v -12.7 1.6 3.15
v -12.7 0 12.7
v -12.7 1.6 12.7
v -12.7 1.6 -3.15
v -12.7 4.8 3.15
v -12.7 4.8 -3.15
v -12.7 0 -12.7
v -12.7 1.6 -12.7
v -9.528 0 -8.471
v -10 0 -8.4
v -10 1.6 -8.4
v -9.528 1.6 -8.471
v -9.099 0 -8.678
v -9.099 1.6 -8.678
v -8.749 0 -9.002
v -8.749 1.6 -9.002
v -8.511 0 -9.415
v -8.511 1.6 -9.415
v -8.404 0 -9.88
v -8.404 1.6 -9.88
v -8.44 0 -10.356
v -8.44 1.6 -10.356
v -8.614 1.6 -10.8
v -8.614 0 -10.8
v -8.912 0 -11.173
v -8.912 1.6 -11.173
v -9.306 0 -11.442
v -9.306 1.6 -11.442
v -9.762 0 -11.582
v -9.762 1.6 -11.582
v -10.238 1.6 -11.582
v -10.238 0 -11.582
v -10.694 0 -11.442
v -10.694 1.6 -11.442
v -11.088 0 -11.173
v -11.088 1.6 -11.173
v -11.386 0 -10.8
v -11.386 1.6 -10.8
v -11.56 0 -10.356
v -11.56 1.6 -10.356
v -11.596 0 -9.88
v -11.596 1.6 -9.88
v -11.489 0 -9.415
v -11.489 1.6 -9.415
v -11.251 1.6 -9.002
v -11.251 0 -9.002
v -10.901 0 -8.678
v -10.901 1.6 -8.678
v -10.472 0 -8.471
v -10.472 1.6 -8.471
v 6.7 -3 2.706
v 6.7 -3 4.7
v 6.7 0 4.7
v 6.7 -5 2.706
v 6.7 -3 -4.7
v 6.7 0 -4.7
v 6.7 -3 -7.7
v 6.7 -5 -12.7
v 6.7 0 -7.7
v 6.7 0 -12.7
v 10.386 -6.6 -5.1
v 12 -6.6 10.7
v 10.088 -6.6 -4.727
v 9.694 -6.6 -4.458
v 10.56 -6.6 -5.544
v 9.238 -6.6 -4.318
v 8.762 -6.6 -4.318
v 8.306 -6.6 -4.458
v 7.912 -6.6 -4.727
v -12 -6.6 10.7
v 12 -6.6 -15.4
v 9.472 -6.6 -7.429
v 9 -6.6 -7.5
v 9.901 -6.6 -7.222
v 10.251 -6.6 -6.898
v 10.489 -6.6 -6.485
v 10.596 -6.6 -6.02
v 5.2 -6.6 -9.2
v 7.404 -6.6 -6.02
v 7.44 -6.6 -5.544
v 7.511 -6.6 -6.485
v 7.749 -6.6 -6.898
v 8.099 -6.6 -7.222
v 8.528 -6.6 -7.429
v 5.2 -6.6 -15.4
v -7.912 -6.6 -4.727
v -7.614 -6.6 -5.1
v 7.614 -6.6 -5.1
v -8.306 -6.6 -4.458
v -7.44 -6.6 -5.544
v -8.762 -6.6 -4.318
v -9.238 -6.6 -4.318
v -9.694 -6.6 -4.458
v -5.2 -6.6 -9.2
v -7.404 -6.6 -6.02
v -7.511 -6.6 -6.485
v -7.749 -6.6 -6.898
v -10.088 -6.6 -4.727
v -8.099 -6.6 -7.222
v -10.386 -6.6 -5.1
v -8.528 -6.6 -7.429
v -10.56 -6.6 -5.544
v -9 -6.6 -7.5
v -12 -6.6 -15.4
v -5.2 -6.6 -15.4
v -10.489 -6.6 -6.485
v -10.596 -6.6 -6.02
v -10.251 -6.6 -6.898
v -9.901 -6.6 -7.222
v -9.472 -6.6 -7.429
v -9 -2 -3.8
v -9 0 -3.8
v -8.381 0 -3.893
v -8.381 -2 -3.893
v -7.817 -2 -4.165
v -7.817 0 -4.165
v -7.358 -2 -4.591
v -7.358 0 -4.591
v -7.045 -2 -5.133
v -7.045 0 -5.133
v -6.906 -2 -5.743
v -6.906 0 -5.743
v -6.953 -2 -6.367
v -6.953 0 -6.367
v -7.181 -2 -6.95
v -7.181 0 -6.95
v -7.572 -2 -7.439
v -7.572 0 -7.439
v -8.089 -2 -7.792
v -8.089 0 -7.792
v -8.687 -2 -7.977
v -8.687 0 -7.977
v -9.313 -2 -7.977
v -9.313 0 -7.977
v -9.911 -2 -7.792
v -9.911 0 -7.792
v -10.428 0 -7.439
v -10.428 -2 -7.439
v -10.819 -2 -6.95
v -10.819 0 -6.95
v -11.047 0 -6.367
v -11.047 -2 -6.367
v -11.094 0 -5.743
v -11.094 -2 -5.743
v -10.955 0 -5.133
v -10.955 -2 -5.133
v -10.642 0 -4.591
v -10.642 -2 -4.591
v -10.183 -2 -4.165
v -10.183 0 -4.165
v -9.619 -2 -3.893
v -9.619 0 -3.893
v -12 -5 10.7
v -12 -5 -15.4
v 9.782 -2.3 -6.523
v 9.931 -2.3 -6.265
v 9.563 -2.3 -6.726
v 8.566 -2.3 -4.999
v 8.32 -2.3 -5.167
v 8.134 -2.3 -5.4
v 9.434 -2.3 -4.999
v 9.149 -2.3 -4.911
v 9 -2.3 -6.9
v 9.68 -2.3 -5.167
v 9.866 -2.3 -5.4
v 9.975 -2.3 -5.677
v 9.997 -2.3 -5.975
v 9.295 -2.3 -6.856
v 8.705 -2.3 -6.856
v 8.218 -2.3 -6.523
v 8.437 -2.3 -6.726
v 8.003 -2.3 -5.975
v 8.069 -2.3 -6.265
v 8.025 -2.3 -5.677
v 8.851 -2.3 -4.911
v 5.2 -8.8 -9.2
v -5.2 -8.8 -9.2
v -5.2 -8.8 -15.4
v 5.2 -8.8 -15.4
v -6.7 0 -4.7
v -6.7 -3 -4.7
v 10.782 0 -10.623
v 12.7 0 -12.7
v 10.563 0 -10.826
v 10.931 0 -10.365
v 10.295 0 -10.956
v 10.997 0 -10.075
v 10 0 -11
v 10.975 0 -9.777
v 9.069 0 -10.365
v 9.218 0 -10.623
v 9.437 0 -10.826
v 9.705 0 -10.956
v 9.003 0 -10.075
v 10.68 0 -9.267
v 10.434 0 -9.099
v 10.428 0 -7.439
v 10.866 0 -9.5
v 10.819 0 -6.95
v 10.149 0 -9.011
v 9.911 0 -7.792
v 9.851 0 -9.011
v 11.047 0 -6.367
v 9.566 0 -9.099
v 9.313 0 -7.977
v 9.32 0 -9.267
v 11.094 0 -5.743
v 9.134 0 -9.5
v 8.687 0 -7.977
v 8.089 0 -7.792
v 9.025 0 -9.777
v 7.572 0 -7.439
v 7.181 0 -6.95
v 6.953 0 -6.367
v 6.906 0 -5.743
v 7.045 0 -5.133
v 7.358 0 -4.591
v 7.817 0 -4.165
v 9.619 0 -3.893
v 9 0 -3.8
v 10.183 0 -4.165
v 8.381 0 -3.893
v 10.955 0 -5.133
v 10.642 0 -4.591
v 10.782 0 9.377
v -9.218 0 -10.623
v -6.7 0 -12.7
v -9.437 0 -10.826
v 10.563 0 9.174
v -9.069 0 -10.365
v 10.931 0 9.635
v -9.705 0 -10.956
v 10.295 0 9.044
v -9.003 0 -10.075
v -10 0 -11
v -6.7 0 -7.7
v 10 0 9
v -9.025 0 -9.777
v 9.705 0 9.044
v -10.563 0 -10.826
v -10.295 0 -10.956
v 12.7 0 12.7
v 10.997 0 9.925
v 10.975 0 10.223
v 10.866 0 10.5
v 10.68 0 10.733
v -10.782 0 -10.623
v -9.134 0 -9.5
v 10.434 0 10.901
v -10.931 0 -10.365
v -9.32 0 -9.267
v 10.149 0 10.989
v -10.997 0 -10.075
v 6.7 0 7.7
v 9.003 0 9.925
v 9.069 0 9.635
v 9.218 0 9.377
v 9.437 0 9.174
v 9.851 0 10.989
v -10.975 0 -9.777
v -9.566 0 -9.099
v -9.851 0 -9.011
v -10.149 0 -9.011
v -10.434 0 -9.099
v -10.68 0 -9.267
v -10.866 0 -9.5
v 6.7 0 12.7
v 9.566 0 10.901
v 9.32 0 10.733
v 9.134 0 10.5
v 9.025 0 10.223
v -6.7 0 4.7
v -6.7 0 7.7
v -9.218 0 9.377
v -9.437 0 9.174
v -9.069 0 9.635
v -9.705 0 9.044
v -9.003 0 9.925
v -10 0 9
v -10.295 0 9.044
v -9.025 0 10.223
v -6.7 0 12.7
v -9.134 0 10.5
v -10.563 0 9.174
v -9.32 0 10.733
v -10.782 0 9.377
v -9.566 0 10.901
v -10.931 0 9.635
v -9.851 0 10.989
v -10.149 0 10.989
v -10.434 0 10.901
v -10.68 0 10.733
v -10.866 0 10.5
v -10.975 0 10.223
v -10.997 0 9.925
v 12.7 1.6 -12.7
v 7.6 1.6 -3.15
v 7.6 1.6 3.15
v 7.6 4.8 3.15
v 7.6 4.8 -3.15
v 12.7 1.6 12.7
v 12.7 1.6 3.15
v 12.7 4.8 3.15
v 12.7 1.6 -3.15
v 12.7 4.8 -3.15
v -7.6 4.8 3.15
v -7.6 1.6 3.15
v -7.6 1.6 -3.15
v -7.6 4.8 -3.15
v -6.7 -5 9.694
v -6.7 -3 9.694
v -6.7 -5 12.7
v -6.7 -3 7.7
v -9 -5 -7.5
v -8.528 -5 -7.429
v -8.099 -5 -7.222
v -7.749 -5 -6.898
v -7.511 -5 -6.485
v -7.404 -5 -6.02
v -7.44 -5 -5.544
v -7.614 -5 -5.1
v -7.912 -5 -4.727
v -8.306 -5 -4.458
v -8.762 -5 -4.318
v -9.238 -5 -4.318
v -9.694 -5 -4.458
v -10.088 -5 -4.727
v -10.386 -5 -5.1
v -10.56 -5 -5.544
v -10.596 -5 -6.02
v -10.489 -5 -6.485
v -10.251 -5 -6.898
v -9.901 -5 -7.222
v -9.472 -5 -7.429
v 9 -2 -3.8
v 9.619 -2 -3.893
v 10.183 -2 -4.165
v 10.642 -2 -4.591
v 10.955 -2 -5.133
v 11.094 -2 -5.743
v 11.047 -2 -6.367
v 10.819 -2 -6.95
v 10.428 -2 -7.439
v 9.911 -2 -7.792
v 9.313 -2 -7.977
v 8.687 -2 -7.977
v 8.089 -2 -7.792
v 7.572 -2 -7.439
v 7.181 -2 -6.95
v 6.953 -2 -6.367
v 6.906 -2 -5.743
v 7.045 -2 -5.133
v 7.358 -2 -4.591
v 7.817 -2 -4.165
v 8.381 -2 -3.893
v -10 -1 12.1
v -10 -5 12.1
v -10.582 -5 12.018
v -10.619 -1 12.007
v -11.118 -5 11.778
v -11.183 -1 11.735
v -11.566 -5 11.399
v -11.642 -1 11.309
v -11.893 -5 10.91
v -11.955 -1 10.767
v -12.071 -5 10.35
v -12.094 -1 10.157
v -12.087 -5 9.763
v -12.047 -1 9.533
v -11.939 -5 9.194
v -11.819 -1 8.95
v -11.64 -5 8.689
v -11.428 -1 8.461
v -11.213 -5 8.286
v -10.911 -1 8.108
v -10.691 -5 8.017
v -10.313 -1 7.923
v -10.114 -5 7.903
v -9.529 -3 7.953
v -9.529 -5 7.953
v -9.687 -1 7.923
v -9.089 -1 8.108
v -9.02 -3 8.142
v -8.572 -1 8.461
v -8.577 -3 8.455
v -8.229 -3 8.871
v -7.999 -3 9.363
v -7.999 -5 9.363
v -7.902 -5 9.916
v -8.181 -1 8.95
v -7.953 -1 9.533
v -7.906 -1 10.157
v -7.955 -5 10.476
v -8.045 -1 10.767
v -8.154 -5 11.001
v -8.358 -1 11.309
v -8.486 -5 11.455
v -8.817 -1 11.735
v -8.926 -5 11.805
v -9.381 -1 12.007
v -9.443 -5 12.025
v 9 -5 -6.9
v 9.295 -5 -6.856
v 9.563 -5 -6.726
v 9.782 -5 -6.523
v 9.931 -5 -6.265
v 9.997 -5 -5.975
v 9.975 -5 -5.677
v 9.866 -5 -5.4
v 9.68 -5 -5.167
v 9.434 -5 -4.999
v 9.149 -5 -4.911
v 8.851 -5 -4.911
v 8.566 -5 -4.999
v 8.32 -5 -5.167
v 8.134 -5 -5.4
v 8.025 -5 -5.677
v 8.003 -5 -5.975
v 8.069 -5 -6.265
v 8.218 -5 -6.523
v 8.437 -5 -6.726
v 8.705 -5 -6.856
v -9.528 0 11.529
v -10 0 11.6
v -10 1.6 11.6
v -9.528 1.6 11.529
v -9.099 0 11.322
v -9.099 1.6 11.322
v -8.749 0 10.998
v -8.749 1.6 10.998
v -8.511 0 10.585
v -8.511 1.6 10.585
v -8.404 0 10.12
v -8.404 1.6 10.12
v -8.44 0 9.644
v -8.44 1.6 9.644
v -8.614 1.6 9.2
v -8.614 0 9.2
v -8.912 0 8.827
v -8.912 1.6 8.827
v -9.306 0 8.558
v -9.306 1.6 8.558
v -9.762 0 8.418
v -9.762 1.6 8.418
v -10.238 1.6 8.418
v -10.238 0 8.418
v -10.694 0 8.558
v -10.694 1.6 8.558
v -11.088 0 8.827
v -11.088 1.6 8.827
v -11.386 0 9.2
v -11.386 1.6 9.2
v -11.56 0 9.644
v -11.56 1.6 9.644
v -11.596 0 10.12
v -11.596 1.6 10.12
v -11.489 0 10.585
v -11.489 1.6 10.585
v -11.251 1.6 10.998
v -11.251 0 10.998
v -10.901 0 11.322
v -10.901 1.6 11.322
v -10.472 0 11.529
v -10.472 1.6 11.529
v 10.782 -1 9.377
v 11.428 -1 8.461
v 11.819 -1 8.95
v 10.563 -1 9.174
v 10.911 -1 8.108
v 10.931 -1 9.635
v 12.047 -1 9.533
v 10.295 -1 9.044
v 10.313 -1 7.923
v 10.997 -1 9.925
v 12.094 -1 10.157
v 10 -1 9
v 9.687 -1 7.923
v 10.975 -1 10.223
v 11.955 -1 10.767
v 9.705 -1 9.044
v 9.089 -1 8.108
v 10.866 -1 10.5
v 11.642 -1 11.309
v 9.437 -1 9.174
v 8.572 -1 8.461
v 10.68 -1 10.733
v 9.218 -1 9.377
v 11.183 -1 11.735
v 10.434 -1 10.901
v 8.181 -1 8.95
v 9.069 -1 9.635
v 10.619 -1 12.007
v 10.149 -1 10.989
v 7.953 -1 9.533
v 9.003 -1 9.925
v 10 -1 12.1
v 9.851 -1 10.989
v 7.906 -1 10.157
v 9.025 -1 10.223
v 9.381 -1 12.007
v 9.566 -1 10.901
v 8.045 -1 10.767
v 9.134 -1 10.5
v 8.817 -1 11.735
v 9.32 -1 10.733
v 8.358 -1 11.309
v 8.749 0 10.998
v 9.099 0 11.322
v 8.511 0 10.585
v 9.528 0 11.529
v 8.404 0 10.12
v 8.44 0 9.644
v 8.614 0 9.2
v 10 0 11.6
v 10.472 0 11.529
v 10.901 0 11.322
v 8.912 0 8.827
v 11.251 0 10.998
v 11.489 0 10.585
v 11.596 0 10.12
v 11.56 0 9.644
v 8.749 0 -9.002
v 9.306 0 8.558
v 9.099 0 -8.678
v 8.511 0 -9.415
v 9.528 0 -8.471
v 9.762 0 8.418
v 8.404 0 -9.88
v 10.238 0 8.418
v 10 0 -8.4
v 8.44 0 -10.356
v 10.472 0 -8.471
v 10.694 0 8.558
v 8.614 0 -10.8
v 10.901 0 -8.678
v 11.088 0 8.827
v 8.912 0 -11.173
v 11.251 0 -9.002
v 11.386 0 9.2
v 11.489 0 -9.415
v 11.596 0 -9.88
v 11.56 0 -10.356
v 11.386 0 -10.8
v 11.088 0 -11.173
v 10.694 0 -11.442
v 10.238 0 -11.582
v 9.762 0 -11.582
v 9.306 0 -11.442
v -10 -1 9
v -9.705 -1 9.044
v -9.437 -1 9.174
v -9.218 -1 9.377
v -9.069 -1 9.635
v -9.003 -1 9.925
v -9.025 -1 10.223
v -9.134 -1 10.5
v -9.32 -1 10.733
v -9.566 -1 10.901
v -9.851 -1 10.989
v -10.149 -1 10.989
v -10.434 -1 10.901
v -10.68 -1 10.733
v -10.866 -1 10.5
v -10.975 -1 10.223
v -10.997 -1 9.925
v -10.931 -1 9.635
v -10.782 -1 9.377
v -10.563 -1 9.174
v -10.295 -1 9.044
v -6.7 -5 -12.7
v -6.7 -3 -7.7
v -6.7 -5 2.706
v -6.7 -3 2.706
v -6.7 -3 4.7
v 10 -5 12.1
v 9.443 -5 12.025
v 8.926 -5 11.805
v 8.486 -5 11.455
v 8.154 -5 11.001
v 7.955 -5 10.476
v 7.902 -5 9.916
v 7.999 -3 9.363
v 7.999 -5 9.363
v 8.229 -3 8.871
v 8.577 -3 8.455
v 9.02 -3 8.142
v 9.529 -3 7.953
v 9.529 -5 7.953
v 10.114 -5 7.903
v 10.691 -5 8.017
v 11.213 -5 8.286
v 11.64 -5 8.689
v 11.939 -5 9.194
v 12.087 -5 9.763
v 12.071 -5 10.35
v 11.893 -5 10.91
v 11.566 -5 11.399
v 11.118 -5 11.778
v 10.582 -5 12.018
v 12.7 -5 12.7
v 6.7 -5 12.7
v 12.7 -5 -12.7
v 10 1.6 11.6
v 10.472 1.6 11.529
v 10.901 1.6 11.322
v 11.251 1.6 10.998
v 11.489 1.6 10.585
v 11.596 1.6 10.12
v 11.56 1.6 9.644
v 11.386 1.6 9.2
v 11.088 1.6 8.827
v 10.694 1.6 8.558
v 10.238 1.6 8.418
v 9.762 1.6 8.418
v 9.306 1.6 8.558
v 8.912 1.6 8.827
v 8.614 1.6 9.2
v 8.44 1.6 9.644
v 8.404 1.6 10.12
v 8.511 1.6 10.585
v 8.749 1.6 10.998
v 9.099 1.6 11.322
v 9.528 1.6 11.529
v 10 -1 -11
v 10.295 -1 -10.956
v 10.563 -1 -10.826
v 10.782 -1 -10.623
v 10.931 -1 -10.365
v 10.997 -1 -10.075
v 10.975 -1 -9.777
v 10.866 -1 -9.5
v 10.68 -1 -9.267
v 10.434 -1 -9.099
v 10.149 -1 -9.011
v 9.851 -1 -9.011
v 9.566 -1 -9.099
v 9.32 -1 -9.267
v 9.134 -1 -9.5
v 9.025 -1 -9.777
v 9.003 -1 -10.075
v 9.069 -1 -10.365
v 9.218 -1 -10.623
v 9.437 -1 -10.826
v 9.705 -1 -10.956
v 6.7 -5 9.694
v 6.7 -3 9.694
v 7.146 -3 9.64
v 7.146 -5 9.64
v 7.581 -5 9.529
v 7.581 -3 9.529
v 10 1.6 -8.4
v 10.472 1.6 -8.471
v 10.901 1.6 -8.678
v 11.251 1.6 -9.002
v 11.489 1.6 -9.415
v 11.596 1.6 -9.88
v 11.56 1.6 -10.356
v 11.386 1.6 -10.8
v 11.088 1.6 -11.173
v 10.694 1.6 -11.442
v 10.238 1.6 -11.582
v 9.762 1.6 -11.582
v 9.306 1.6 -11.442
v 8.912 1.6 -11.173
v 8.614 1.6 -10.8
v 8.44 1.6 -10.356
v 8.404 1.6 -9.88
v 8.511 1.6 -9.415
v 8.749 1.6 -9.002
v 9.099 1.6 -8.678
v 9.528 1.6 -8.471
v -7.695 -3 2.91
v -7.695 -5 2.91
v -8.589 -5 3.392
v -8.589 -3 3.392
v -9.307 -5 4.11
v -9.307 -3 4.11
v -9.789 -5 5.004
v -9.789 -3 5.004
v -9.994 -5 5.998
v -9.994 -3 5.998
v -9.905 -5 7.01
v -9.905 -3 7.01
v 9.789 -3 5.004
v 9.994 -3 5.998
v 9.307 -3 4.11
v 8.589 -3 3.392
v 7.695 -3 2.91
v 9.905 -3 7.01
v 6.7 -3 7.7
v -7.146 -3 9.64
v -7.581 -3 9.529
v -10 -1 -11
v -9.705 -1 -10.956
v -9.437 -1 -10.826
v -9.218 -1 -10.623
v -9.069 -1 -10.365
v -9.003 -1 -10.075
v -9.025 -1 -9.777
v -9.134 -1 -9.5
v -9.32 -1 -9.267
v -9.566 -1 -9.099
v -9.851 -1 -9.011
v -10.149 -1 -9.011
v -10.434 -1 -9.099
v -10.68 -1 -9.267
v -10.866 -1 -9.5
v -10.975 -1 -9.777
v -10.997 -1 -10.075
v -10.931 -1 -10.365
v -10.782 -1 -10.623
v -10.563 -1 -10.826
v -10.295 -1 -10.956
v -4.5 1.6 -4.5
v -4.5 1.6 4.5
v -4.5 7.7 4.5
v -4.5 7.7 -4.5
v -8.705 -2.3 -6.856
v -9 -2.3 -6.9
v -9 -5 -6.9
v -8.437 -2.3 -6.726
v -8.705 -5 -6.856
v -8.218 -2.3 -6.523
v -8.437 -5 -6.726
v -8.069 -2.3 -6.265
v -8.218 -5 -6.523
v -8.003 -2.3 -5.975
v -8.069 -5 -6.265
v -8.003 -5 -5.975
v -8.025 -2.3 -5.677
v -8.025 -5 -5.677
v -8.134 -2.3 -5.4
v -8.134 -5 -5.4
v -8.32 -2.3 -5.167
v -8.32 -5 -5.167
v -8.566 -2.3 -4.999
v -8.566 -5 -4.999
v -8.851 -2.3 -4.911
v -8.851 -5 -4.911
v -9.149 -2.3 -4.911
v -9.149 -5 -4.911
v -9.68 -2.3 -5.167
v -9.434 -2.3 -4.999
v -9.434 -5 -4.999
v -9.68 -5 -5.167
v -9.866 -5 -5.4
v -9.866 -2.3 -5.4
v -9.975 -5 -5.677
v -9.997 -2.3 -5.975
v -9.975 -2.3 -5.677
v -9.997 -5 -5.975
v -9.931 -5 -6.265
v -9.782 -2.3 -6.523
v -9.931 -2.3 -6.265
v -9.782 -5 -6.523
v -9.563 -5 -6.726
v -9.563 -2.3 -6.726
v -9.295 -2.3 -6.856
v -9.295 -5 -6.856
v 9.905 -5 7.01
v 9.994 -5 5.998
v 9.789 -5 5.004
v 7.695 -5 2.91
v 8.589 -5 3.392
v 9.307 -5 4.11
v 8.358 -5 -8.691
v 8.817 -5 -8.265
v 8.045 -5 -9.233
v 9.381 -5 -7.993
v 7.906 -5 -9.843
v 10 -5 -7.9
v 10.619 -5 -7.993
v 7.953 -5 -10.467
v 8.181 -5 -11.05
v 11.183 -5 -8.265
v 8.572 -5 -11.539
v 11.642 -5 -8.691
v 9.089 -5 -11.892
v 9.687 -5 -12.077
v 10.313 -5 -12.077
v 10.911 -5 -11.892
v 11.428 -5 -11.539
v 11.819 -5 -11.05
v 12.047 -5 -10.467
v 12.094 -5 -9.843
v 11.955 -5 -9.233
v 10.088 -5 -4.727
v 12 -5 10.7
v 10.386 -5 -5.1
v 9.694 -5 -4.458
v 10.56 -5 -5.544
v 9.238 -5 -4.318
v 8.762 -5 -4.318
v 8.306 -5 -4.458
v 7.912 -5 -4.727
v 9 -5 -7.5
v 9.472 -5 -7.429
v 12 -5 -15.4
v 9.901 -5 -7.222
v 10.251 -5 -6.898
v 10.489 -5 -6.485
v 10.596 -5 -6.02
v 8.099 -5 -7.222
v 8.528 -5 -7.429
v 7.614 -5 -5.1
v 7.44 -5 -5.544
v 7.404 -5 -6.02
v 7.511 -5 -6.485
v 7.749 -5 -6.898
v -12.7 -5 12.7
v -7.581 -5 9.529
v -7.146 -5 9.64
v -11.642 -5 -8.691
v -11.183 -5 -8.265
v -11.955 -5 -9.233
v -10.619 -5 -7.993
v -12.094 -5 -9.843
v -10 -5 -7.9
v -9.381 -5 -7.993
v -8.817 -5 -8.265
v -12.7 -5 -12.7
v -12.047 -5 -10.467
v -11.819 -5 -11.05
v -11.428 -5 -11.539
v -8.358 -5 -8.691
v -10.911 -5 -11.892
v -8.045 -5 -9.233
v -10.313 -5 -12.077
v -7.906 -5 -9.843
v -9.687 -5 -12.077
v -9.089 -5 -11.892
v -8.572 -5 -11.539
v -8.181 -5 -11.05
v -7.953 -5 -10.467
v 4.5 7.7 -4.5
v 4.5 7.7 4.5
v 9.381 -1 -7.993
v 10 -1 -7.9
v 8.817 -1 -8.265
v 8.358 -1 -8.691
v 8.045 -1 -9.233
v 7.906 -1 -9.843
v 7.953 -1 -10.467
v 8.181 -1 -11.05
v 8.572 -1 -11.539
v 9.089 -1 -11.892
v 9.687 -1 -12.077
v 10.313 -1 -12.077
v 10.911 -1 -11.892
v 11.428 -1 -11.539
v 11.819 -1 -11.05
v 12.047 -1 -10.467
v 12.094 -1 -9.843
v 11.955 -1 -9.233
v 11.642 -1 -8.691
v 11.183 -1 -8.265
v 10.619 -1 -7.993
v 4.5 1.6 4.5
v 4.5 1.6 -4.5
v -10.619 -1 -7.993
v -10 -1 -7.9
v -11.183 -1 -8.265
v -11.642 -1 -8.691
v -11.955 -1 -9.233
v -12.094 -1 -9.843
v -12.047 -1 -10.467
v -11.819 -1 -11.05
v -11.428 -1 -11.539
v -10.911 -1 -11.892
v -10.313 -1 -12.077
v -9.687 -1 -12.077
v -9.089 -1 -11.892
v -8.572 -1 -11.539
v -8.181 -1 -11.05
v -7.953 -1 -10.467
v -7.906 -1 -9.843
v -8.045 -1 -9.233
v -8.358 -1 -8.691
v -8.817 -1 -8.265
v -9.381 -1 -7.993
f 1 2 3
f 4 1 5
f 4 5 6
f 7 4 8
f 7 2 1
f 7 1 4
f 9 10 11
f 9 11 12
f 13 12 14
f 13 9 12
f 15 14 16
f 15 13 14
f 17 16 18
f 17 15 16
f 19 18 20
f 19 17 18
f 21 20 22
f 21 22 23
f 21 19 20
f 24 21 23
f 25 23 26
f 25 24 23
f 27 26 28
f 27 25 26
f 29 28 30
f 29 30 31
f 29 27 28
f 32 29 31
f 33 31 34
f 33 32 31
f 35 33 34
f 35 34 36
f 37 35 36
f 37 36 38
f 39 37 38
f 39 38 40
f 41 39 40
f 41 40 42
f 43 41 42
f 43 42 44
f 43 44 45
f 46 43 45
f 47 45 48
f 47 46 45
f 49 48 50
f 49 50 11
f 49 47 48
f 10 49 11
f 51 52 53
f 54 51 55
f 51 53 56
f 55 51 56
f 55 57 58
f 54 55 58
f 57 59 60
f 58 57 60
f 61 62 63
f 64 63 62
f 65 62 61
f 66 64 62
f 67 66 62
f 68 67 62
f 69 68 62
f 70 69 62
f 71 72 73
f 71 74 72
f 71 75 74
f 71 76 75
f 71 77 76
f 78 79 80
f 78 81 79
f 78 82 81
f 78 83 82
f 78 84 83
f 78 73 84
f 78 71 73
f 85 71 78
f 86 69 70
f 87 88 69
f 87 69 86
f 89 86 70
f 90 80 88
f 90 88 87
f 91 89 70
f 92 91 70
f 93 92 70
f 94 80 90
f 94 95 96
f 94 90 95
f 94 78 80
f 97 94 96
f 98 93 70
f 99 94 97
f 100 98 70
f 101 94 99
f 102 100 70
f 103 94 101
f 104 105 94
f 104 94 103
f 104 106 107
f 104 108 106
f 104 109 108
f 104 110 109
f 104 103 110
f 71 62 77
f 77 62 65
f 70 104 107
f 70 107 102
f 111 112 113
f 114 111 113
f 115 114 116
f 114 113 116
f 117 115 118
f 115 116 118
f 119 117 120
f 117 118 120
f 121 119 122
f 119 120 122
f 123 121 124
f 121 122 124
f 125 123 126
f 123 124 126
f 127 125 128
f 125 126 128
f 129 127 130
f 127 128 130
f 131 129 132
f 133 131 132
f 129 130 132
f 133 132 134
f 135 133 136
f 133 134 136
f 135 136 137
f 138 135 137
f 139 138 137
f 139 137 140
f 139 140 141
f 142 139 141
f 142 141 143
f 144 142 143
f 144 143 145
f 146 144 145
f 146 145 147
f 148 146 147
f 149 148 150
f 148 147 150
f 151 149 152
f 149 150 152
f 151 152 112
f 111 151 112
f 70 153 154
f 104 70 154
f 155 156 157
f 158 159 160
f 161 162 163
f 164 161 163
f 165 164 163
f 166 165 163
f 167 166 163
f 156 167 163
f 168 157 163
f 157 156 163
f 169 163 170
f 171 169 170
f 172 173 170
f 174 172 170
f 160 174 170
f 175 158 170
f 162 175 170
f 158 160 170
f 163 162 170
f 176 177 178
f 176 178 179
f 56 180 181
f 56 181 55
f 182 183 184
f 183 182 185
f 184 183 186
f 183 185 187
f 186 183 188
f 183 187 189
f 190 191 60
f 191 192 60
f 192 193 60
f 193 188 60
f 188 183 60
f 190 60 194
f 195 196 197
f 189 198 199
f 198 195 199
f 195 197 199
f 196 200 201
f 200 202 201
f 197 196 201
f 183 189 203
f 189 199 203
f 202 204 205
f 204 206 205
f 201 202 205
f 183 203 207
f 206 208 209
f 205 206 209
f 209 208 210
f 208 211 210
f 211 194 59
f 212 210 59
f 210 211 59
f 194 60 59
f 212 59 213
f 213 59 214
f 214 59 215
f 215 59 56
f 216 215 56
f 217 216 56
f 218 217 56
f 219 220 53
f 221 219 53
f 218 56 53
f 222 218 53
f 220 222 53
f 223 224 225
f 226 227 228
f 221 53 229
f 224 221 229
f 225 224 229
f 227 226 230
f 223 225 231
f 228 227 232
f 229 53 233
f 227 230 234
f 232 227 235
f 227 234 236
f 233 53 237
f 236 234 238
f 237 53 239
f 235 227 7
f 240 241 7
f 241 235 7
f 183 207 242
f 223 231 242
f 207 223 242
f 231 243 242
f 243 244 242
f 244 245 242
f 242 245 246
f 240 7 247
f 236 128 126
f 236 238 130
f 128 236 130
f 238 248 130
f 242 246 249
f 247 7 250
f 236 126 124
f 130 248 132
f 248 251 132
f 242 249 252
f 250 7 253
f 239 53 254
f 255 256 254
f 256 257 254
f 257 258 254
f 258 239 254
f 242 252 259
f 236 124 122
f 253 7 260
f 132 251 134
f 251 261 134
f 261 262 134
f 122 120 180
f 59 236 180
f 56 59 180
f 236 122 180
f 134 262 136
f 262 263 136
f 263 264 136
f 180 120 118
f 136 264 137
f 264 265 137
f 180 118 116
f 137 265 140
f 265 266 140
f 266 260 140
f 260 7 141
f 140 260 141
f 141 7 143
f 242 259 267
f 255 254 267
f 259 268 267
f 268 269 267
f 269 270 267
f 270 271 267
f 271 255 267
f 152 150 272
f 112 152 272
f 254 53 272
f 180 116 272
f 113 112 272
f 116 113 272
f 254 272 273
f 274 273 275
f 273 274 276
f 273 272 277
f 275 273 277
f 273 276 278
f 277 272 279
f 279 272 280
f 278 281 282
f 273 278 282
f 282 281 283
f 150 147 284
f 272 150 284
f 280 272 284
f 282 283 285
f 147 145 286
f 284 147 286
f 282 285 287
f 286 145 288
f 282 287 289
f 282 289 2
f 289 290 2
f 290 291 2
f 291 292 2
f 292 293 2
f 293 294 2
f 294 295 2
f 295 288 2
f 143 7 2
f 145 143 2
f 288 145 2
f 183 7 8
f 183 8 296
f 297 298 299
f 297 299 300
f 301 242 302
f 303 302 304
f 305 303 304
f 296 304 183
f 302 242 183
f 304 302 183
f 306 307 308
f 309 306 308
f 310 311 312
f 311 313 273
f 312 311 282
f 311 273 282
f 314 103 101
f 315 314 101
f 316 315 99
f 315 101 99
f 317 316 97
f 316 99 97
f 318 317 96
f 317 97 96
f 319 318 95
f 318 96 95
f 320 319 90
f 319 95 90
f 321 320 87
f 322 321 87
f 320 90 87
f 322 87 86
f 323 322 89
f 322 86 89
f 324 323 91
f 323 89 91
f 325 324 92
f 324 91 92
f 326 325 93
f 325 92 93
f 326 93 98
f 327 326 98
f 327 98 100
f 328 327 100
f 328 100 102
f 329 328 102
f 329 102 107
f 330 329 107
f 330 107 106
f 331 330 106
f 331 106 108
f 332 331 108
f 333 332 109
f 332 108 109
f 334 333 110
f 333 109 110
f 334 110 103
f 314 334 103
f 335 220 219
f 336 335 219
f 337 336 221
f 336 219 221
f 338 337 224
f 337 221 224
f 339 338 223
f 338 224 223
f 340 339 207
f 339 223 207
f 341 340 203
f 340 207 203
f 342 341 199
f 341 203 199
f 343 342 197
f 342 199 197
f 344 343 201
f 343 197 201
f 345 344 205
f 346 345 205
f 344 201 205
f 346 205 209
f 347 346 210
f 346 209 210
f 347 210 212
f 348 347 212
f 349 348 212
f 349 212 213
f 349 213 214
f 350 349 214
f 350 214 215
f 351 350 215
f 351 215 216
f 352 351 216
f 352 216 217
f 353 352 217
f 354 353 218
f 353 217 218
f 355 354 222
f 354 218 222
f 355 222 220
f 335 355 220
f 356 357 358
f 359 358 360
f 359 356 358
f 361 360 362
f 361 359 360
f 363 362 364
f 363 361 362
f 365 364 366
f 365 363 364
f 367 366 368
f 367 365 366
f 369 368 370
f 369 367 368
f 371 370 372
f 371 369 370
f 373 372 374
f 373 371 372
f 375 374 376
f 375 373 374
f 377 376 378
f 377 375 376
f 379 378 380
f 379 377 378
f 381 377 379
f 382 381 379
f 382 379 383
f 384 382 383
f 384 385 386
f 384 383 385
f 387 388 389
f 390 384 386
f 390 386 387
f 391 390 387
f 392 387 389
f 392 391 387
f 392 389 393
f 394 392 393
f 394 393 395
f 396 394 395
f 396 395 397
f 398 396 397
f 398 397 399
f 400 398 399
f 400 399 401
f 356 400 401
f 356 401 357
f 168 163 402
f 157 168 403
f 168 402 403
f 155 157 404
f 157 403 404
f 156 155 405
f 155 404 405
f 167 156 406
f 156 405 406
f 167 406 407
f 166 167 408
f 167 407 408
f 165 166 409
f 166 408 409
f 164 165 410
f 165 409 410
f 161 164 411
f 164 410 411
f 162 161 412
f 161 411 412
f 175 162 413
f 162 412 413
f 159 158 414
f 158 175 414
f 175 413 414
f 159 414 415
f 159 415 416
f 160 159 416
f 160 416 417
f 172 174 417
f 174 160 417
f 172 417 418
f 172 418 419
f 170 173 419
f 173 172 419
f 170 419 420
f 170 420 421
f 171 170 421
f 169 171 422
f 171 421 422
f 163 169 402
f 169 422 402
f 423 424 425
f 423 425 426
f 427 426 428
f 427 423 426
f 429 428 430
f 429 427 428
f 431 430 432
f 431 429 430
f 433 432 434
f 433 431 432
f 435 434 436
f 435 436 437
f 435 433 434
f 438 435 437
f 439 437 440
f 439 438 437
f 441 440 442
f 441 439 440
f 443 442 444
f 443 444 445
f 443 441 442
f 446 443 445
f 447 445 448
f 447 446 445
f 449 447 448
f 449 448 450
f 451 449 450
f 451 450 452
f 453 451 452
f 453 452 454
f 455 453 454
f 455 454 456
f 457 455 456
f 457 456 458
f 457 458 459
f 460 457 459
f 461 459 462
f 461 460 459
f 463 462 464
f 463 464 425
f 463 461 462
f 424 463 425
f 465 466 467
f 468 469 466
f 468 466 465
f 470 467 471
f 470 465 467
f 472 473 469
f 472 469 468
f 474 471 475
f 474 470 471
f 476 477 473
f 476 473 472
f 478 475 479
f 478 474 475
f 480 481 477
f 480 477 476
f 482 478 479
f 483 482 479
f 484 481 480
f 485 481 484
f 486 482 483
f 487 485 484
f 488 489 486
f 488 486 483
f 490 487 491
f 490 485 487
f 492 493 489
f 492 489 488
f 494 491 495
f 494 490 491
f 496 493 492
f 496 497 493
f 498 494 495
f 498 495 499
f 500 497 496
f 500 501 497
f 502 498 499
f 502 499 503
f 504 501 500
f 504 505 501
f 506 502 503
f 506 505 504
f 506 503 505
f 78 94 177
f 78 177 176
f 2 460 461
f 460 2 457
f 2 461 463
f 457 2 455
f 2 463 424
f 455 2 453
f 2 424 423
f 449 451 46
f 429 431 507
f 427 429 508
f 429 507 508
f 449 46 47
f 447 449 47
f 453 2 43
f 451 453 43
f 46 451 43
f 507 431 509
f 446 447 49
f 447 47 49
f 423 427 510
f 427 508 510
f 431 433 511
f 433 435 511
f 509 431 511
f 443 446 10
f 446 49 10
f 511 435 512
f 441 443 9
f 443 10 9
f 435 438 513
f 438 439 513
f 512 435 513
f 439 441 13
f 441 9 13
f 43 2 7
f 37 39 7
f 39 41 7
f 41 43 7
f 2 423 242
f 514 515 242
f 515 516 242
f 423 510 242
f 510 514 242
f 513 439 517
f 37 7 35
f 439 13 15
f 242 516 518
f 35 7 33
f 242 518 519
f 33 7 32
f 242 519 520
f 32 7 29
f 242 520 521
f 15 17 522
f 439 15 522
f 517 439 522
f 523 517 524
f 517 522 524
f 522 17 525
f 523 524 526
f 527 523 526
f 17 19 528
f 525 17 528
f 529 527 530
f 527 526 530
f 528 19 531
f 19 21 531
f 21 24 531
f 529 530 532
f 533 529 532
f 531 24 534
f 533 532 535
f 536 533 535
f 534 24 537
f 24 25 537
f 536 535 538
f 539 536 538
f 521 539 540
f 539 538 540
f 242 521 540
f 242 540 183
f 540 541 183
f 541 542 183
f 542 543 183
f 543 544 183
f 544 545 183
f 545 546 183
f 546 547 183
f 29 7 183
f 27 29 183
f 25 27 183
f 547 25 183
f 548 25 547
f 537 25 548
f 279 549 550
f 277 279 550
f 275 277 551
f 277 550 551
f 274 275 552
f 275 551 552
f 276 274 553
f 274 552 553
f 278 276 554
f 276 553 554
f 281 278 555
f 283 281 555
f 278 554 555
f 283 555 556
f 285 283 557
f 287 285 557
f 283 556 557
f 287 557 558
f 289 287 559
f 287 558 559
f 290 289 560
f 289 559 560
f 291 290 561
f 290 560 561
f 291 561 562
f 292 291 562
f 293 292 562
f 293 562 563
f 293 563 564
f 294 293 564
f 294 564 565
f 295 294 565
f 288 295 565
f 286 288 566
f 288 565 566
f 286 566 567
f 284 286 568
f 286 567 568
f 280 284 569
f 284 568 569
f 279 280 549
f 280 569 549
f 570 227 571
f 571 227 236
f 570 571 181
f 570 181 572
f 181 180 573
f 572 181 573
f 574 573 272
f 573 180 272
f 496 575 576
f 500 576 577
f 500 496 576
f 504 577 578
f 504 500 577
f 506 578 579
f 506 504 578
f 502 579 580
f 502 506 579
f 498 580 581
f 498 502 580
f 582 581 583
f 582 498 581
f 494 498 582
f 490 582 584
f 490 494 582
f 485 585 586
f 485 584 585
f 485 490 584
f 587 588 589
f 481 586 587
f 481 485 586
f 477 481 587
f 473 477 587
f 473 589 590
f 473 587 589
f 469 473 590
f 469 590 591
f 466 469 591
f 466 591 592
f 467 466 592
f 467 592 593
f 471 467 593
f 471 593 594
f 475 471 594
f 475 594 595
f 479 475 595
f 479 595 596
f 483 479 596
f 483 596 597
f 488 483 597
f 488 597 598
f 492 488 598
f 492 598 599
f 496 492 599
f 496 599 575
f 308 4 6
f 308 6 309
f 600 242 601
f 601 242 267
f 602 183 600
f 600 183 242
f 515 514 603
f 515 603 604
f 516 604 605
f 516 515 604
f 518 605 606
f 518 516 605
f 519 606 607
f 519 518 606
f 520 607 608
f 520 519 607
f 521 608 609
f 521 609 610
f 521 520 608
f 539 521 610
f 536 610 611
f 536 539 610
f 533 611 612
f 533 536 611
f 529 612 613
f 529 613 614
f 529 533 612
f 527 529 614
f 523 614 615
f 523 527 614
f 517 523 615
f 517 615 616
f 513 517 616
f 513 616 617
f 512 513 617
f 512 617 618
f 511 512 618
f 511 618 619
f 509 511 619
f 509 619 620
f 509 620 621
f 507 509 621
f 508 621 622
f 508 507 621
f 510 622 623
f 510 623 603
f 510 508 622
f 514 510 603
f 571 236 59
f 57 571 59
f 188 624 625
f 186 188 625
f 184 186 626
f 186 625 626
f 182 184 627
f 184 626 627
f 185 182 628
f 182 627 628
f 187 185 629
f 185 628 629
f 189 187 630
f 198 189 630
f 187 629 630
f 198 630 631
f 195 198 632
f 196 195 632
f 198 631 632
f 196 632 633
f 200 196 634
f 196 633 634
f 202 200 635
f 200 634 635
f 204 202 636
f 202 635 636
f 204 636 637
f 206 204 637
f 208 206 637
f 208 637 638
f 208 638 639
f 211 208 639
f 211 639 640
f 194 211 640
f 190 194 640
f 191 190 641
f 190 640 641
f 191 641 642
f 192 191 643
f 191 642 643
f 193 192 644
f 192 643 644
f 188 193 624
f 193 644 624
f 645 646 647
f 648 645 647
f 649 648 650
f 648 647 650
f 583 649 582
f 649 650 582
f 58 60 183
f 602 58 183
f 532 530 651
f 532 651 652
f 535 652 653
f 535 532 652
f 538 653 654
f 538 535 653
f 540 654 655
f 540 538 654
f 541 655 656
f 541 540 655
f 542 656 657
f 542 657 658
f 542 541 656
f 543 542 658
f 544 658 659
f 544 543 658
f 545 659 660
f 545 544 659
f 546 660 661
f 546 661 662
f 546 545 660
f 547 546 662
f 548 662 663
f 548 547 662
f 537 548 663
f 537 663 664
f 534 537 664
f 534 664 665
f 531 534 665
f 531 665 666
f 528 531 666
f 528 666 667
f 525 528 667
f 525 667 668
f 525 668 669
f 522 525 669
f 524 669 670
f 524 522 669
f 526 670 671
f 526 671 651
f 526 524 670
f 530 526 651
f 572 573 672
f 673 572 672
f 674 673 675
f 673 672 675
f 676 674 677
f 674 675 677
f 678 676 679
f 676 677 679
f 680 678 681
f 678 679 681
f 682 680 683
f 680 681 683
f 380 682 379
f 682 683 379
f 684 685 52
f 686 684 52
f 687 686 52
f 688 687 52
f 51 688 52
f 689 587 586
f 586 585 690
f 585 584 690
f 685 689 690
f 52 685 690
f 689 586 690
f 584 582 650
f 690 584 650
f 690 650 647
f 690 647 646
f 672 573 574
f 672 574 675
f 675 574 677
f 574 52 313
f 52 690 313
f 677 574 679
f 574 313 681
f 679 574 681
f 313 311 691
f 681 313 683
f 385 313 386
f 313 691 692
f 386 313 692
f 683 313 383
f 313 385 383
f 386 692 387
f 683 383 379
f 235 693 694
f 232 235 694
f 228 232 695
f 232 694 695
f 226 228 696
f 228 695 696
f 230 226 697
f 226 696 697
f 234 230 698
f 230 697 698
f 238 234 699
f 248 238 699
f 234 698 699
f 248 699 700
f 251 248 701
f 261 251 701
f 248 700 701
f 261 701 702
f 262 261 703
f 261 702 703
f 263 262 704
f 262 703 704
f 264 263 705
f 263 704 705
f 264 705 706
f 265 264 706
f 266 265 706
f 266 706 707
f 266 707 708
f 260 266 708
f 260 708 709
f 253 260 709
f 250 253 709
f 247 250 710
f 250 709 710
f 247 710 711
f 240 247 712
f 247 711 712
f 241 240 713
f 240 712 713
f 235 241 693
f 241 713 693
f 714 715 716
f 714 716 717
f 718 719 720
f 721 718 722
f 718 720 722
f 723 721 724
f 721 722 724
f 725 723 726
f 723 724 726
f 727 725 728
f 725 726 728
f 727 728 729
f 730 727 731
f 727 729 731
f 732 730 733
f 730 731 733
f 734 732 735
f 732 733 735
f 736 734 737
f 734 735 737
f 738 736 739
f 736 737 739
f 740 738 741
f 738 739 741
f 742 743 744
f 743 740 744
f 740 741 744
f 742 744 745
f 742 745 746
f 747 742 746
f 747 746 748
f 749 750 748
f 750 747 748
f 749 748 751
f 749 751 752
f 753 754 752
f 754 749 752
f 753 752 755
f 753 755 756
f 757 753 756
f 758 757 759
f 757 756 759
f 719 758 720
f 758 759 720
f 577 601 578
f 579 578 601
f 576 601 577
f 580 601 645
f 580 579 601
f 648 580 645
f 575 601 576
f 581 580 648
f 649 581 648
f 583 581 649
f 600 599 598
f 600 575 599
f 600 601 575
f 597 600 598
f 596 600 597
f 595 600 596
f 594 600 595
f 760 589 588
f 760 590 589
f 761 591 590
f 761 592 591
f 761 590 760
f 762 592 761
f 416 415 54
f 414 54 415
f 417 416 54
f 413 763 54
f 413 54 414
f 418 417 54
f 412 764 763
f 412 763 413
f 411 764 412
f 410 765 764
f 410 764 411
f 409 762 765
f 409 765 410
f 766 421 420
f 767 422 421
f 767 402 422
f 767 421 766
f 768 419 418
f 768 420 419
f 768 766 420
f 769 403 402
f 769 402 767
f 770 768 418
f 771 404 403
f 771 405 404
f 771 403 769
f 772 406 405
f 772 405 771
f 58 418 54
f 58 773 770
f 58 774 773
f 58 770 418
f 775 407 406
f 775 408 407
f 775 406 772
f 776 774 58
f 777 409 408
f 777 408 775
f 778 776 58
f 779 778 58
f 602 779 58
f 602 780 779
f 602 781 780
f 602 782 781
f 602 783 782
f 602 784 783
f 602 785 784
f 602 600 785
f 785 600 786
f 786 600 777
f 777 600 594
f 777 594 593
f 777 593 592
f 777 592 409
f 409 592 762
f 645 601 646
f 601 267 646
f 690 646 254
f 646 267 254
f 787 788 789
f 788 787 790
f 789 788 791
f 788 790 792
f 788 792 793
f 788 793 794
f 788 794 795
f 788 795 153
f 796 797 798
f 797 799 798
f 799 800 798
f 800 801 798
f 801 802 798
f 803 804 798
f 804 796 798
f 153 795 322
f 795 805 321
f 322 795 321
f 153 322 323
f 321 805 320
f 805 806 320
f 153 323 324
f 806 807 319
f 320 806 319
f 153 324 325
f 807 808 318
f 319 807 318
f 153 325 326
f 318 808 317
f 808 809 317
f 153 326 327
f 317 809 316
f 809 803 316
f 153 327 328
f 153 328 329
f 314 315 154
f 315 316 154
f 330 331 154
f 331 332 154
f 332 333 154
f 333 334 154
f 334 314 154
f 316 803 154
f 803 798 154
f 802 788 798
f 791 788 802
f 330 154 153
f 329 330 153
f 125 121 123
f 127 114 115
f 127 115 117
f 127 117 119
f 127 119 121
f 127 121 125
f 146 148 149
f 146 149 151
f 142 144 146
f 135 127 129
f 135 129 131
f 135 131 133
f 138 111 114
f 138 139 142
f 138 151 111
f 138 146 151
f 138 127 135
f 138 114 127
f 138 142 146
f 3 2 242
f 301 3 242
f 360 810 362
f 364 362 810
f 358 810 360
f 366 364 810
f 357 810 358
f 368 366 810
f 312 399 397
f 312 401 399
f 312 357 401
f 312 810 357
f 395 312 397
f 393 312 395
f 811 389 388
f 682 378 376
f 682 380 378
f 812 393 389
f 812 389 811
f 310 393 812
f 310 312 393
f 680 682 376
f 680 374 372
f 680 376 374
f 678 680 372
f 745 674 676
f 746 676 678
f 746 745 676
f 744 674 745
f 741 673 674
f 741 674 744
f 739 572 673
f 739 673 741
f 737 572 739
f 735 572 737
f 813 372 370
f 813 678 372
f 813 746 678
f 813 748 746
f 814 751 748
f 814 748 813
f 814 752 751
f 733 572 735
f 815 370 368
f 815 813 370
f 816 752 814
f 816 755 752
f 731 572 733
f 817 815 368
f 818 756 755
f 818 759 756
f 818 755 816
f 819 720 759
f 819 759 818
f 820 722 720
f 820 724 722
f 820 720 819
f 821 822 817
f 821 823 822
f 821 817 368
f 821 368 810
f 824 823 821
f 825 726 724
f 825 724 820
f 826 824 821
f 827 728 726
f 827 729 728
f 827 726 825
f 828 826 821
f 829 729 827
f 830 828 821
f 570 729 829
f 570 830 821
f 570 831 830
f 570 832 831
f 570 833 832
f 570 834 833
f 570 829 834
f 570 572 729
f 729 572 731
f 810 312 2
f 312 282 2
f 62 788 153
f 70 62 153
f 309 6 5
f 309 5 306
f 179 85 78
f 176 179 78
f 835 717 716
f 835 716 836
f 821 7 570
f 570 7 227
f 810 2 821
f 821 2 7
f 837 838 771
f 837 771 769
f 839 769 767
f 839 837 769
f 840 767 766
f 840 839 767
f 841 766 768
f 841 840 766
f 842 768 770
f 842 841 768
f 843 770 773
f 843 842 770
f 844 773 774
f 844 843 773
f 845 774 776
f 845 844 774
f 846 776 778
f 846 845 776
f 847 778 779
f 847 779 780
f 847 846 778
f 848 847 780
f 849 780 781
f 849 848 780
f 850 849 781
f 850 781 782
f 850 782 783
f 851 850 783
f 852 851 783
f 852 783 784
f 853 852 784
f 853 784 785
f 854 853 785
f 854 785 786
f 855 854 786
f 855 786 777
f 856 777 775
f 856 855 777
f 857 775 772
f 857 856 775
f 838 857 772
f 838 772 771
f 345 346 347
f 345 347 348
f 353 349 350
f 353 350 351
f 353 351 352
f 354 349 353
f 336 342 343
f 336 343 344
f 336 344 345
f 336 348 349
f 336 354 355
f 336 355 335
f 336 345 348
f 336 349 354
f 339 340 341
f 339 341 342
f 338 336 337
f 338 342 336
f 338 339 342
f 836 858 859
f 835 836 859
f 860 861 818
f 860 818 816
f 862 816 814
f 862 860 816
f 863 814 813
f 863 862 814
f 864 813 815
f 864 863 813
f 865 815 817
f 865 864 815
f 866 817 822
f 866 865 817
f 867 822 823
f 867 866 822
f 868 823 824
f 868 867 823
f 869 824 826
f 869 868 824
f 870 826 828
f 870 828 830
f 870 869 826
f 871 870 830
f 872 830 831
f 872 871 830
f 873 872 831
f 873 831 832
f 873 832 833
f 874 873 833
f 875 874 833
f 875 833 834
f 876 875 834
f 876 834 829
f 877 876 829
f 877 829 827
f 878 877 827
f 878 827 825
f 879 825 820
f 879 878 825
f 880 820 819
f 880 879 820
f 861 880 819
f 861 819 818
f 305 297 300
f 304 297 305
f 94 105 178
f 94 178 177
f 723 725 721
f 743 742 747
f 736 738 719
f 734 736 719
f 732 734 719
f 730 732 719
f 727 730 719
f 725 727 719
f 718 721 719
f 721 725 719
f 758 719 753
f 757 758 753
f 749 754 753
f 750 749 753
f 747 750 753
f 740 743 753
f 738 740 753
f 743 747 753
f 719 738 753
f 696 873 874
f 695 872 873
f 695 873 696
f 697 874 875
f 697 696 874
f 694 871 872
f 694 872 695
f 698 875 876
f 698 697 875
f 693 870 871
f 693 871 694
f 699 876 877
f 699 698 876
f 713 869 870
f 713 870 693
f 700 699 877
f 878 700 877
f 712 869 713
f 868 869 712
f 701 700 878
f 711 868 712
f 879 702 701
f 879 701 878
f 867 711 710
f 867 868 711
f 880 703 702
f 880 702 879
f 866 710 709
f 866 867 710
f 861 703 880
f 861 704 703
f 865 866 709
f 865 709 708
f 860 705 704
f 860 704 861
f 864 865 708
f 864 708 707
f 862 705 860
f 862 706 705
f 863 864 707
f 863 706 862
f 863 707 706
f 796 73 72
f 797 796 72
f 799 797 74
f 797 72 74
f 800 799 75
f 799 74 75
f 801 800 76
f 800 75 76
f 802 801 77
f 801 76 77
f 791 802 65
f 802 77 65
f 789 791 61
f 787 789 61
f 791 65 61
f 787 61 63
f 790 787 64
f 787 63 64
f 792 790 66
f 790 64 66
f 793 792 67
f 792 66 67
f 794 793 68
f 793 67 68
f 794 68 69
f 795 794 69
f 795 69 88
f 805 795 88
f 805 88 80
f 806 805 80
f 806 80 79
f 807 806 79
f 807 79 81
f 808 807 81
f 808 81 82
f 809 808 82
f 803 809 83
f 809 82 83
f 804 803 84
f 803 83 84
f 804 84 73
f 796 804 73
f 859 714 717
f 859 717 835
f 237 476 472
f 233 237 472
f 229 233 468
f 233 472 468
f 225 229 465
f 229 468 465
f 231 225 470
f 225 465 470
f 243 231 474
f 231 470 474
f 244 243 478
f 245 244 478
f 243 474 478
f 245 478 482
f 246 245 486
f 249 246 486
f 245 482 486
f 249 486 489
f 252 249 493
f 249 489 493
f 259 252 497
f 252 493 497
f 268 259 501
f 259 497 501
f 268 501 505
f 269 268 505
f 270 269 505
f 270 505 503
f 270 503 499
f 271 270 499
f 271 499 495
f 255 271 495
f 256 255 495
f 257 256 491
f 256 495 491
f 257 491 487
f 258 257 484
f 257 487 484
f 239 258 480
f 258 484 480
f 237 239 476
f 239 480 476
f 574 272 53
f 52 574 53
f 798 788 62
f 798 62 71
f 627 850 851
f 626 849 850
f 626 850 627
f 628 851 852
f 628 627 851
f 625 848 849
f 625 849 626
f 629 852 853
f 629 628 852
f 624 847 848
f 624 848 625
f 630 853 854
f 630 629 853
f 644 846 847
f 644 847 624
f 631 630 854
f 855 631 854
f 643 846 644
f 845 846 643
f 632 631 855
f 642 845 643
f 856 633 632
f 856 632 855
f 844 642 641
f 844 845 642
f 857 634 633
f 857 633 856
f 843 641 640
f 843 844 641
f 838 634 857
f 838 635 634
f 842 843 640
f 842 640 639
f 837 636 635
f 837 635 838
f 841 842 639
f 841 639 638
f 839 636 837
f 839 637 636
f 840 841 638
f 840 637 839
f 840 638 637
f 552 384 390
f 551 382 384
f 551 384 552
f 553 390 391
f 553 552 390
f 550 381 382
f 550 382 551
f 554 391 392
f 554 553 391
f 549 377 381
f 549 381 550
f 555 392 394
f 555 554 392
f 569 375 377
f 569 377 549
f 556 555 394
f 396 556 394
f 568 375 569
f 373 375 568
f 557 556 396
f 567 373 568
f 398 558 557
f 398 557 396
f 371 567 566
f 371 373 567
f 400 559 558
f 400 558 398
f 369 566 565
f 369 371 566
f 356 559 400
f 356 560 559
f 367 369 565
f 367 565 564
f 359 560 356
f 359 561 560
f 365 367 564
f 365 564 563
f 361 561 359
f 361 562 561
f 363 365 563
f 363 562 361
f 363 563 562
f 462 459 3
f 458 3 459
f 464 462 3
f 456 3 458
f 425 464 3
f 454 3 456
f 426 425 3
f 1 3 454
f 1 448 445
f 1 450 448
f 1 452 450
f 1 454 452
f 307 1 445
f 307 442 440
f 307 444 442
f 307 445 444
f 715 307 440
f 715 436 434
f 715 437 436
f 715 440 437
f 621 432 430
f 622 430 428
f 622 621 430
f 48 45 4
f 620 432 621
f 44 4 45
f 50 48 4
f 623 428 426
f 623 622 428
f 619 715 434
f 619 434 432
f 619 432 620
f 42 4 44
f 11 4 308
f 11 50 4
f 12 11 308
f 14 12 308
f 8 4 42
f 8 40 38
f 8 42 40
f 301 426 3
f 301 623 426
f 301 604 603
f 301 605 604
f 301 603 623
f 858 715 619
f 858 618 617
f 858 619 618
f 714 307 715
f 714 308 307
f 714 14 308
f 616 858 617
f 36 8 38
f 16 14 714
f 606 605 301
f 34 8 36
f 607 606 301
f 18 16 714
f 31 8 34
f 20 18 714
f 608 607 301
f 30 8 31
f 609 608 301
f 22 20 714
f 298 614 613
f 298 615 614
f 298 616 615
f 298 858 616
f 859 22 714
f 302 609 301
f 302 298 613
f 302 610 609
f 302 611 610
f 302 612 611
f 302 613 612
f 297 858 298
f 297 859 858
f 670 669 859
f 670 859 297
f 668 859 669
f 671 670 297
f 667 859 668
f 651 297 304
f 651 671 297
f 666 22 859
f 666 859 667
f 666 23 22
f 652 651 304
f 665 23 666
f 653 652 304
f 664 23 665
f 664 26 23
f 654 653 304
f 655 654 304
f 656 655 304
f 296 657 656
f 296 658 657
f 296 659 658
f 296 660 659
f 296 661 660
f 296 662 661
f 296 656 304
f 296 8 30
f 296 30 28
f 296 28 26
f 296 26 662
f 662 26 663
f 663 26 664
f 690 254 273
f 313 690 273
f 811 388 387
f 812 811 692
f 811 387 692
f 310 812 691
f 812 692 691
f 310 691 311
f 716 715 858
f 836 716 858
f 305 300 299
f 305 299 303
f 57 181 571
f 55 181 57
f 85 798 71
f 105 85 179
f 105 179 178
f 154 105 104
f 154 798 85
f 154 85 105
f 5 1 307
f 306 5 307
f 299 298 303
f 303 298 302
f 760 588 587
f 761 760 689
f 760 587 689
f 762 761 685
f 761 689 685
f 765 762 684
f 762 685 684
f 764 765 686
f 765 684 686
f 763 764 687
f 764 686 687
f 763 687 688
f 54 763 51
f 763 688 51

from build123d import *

# Parameters (mm, degrees)
SKETCH1_W            = 25.4
SKETCH1_H            = 25.4
SKETCH1_R            = 1.6
BOSS_EXTRUDE1_DEPTH  = 1.6
SKETCH2_W            = 9
SKETCH2_H            = 9
BOSS_EXTRUDE2_DEPTH  = 6.1
SKETCH3_W            = 5.1
SKETCH3_H            = 6.3
BOSS_EXTRUDE3_DEPTH  = 3.2
SKETCH4_W            = 24
SKETCH4_H            = 26.1
BOSS_EXTRUDE4_DEPTH  = 1.6
SKETCH5_R            = 1.6
CUT_EXTRUDE1_DEPTH   = 1.6
SKETCH6_W            = 10.4
SKETCH6_H            = 6.2
BOSS_EXTRUDE5_DEPTH  = 2.2
SKETCH7_R            = 1.6
SKETCH7_W            = 13.4
SKETCH7_H            = 3
BOSS_EXTRUDE6_DEPTH  = 1
SKETCH8_R            = 1.6
SKETCH8_R_2          = 2.1
SKETCH8_W            = 13.4
SKETCH8_H            = 9.4
BOSS_EXTRUDE7_DEPTH  = 4
SKETCH9_R            = 1.6
SKETCH9_R_2          = 1
BOSS_EXTRUDE8_DEPTH  = 1
SKETCH10_R           = 1.6
SKETCH10_R_2         = 1
BOSS_EXTRUDE9_DEPTH  = 4
SKETCH11_R           = 2.1
SKETCH11_R_2         = 1
CUT_EXTRUDE2_DEPTH   = 2
SKETCH12_R           = 1
BOSS_EXTRUDE10_DEPTH = 0.3
SKETCH13_W           = 13.4
SKETCH13_H           = 15.4
CUT_EXTRUDE3_DEPTH   = 2
CUT_EXTRUDE4_DEPTH   = 11


with BuildPart() as part:
    # Sketch1 → Boss-Extrude1 (new body)
    with BuildSketch(Plane(origin=(0, 0, 0), x_dir=(1, 0, 0), z_dir=(0, 1, 0))):
        Rectangle(SKETCH1_W, SKETCH1_H)
        with Locations(Location((-10, 10, 0), (0, 0, 270))):
            Circle(SKETCH1_R, mode=Mode.SUBTRACT)
        with Locations(Location((10, 10, 0), (0, 0, 270))):
            Circle(SKETCH1_R, mode=Mode.SUBTRACT)
        with Locations(Location((10, -10, 0), (0, 0, 270))):
            Circle(SKETCH1_R, mode=Mode.SUBTRACT)
        with Locations(Location((-10, -10, 0), (0, 0, 270))):
            Circle(SKETCH1_R, mode=Mode.SUBTRACT)
    extrude(amount=BOSS_EXTRUDE1_DEPTH)

    # Sketch2 → Boss-Extrude2 (add)
    with BuildSketch(Plane(origin=(0, 1.6, 0), x_dir=(1, 0, 0), z_dir=(0, 1, 0))):
        Rectangle(SKETCH2_W, SKETCH2_H)
    extrude(amount=BOSS_EXTRUDE2_DEPTH)

    # Sketch3 → Boss-Extrude3 (add)
    with BuildSketch(Plane(origin=(0, 1.6, 0), x_dir=(1, 0, 0), z_dir=(0, 1, 0))):
        with Locations((-10.15, 0)):
            Rectangle(SKETCH3_W, SKETCH3_H)
        with Locations((10.15, 0)):
            Rectangle(SKETCH3_W, SKETCH3_H)
    extrude(amount=BOSS_EXTRUDE3_DEPTH)


with BuildPart() as body_2:
    # Sketch4 → Boss-Extrude4 (new body)
    with BuildSketch(Plane(origin=(0, -5, 0), x_dir=(-1, 0, 0), z_dir=(0, -1, 0))):
        with Locations((0, 2.35)):
            Rectangle(SKETCH4_W, SKETCH4_H)
    extrude(amount=BOSS_EXTRUDE4_DEPTH)

    # Sketch5 → Cut-Extrude1 (cut)
    with BuildSketch(Plane.XZ.offset(6.6)):
        with Locations(Location((-9, -5.9, 0), (0, 0, 270))):
            Circle(SKETCH5_R)
        with Locations(Location((9, -5.9, 0), (0, 0, 270))):
            Circle(SKETCH5_R)
    extrude(amount=-CUT_EXTRUDE1_DEPTH, mode=Mode.SUBTRACT)

    # Sketch6 → Boss-Extrude5 (add)
    with BuildSketch(Plane.XZ.offset(6.6)):
        with Locations((0, -12.3)):
            Rectangle(SKETCH6_W, SKETCH6_H)
    extrude(amount=BOSS_EXTRUDE5_DEPTH)


with BuildPart() as body_3:
    # Sketch7 → Boss-Extrude6 (new body)
    # profile 1 of 4: a face of its own
    with BuildSketch(Plane.XZ):
        Polygon((12.7, 12.7), (6.7, 12.7), (6.7, 7.7), (6.7, 4.7), (6.7, -4.7), (6.7, -7.7), (6.7, -12.7), (12.7, -12.7), align=None)
        with Locations(Location((10, -10, 0), (0, 0, 270))):
            Circle(SKETCH7_R, mode=Mode.SUBTRACT)
        with Locations(Location((10, 10, 0), (0, 0, 270))):
            Circle(SKETCH7_R, mode=Mode.SUBTRACT)
    # profile 2 of 4: a face of its own
    with BuildSketch(Plane.XZ):
        with Locations((0, 6.2)):
            Rectangle(SKETCH7_W, SKETCH7_H)
    # profile 3 of 4: a face of its own
    with BuildSketch(Plane.XZ):
        with Locations((0, -6.2)):
            Rectangle(SKETCH7_W, SKETCH7_H)
    # profile 4 of 4: a face of its own
    with BuildSketch(Plane.XZ):
        Polygon((-6.7, 12.7), (-12.7, 12.7), (-12.7, -12.7), (-6.7, -12.7), (-6.7, -7.7), (-6.7, -4.7), (-6.7, 4.7), (-6.7, 7.7), align=None)
        with Locations(Location((-10, -10, 0), (0, 0, 270))):
            Circle(SKETCH7_R, mode=Mode.SUBTRACT)
        with Locations(Location((-10, 10, 0), (0, 0, 270))):
            Circle(SKETCH7_R, mode=Mode.SUBTRACT)
    extrude(amount=BOSS_EXTRUDE6_DEPTH)

    # Sketch8 → Boss-Extrude7 (add)
    with BuildSketch(Plane.XZ.offset(1)):
        Polygon((12.7, 12.7), (6.7, 12.7), (6.7, 7.7), (-6.7, 7.7), (-6.7, 12.7), (-12.7, 12.7), (-12.7, -12.7), (-6.7, -12.7), (-6.7, -7.7), (6.7, -7.7), (6.7, -12.7), (12.7, -12.7), align=None)
        with Locations(Location((9, -5.9, 0), (0, 0, 90))):
            Circle(SKETCH8_R, mode=Mode.SUBTRACT)
        with Locations(Location((-9, -5.9, 0), (0, 0, 90))):
            Circle(SKETCH8_R, mode=Mode.SUBTRACT)
        with Locations(Location((-10, 10, 0), (0, 0, 90))):
            Circle(SKETCH8_R_2, mode=Mode.SUBTRACT)
        with Locations(Location((10, 10, 0), (0, 0, 90))):
            Circle(SKETCH8_R_2, mode=Mode.SUBTRACT)
        with Locations(Location((-10, -10, 0), (0, 0, 90))):
            Circle(SKETCH8_R_2, mode=Mode.SUBTRACT)
        with Locations(Location((10, -10, 0), (0, 0, 90))):
            Circle(SKETCH8_R_2, mode=Mode.SUBTRACT)
        Rectangle(SKETCH8_W, SKETCH8_H, mode=Mode.SUBTRACT)
    extrude(amount=BOSS_EXTRUDE7_DEPTH)

    # Sketch9 → Boss-Extrude8 (add)
    # profile 1 of 4: a face of its own
    with BuildSketch(Plane.XZ.offset(1)):
        with Locations(Location((-10, 10, 0), (0, 0, 90))):
            Circle(SKETCH9_R)
        with Locations(Location((-10, 10, 0), (0, 0, 270))):
            Circle(SKETCH9_R_2, mode=Mode.SUBTRACT)
    # profile 2 of 4: a face of its own
    with BuildSketch(Plane.XZ.offset(1)):
        with Locations(Location((10, 10, 0), (0, 0, 90))):
            Circle(SKETCH9_R)
        with Locations(Location((10, 10, 0), (0, 0, 270))):
            Circle(SKETCH9_R_2, mode=Mode.SUBTRACT)
    # profile 3 of 4: a face of its own
    with BuildSketch(Plane.XZ.offset(1)):
        with Locations(Location((-10, -10, 0), (0, 0, 90))):
            Circle(SKETCH9_R)
        with Locations(Location((-10, -10, 0), (0, 0, 270))):
            Circle(SKETCH9_R_2, mode=Mode.SUBTRACT)
    # profile 4 of 4: a face of its own
    with BuildSketch(Plane.XZ.offset(1)):
        with Locations(Location((10, -10, 0), (0, 0, 90))):
            Circle(SKETCH9_R)
        with Locations(Location((10, -10, 0), (0, 0, 270))):
            Circle(SKETCH9_R_2, mode=Mode.SUBTRACT)
    extrude(amount=-BOSS_EXTRUDE8_DEPTH)

    # Sketch10 → Boss-Extrude9 (add)
    # profile 1 of 2: a face of its own
    with BuildSketch(Plane.XZ.offset(5)):
        with Locations(Location((-9, -5.9, 0), (0, 0, 270))):
            Circle(SKETCH10_R)
        with Locations(Location((-9, -5.9, 0), (0, 0, 270))):
            Circle(SKETCH10_R_2, mode=Mode.SUBTRACT)
    # profile 2 of 2: a face of its own
    with BuildSketch(Plane.XZ.offset(5)):
        with Locations(Location((9, -5.9, 0), (0, 0, 270))):
            Circle(SKETCH10_R)
        with Locations(Location((9, -5.9, 0), (0, 0, 270))):
            Circle(SKETCH10_R_2, mode=Mode.SUBTRACT)
    extrude(amount=-BOSS_EXTRUDE9_DEPTH)

    # Sketch11 → Cut-Extrude2 (cut)
    # profile 1 of 4: a face of its own
    with BuildSketch(Plane(origin=(0, 0, 0), x_dir=(1, 0, 0), z_dir=(0, 1, 0))):
        with Locations(Location((-9, 5.9, 0), (0, 0, 270))):
            Circle(SKETCH11_R)
        with Locations(Location((-9, 5.9, 0), (0, 0, 90))):
            Circle(SKETCH11_R_2, mode=Mode.SUBTRACT)
    # profile 2 of 4: a face of its own
    with BuildSketch(Plane(origin=(0, 0, 0), x_dir=(1, 0, 0), z_dir=(0, 1, 0))):
        with Locations(Location((-9, 5.9, 0), (0, 0, 90))):
            Circle(SKETCH11_R_2)
    # profile 3 of 4: a face of its own
    with BuildSketch(Plane(origin=(0, 0, 0), x_dir=(1, 0, 0), z_dir=(0, 1, 0))):
        with Locations(Location((9, 5.9, 0), (0, 0, 270))):
            Circle(SKETCH11_R)
        with Locations(Location((9, 5.9, 0), (0, 0, 90))):
            Circle(SKETCH11_R_2, mode=Mode.SUBTRACT)
    # profile 4 of 4: a face of its own
    with BuildSketch(Plane(origin=(0, 0, 0), x_dir=(1, 0, 0), z_dir=(0, 1, 0))):
        with Locations(Location((9, 5.9, 0), (0, 0, 90))):
            Circle(SKETCH11_R_2)
    extrude(amount=-CUT_EXTRUDE2_DEPTH, mode=Mode.SUBTRACT)

    # Sketch12 → Boss-Extrude10 (add)
    with BuildSketch(Plane(origin=(0, -2, 0), x_dir=(1, 0, 0), z_dir=(0, 1, 0))):
        with Locations(Location((-9, 5.9, 0), (0, 0, 90))):
            Circle(SKETCH12_R)
        with Locations(Location((9, 5.9, 0), (0, 0, 90))):
            Circle(SKETCH12_R)
    extrude(amount=-BOSS_EXTRUDE10_DEPTH)

    # Sketch13 → Cut-Extrude3 (cut)
    with BuildSketch(Plane.XZ.offset(5)):
        Rectangle(SKETCH13_W, SKETCH13_H)
    extrude(amount=-CUT_EXTRUDE3_DEPTH, mode=Mode.SUBTRACT)

    # Sketch14 → Cut-Extrude4 (cut)
    with BuildSketch(Plane.XZ.offset(3)):
        with BuildLine():
            Line((-6.5, 9.7), (6.5, 9.7))
            ThreePointArc((6.5, 9.7), (10, 6.2), (6.5, 2.7))
            Line((6.5, 2.7), (-6.5, 2.7))
            ThreePointArc((-6.5, 2.7), (-10, 6.2), (-6.5, 9.7))
        make_face()
    extrude(amount=CUT_EXTRUDE4_DEPTH, mode=Mode.SUBTRACT)


solid = Compound([part.part, body_2.part, body_3.part])
